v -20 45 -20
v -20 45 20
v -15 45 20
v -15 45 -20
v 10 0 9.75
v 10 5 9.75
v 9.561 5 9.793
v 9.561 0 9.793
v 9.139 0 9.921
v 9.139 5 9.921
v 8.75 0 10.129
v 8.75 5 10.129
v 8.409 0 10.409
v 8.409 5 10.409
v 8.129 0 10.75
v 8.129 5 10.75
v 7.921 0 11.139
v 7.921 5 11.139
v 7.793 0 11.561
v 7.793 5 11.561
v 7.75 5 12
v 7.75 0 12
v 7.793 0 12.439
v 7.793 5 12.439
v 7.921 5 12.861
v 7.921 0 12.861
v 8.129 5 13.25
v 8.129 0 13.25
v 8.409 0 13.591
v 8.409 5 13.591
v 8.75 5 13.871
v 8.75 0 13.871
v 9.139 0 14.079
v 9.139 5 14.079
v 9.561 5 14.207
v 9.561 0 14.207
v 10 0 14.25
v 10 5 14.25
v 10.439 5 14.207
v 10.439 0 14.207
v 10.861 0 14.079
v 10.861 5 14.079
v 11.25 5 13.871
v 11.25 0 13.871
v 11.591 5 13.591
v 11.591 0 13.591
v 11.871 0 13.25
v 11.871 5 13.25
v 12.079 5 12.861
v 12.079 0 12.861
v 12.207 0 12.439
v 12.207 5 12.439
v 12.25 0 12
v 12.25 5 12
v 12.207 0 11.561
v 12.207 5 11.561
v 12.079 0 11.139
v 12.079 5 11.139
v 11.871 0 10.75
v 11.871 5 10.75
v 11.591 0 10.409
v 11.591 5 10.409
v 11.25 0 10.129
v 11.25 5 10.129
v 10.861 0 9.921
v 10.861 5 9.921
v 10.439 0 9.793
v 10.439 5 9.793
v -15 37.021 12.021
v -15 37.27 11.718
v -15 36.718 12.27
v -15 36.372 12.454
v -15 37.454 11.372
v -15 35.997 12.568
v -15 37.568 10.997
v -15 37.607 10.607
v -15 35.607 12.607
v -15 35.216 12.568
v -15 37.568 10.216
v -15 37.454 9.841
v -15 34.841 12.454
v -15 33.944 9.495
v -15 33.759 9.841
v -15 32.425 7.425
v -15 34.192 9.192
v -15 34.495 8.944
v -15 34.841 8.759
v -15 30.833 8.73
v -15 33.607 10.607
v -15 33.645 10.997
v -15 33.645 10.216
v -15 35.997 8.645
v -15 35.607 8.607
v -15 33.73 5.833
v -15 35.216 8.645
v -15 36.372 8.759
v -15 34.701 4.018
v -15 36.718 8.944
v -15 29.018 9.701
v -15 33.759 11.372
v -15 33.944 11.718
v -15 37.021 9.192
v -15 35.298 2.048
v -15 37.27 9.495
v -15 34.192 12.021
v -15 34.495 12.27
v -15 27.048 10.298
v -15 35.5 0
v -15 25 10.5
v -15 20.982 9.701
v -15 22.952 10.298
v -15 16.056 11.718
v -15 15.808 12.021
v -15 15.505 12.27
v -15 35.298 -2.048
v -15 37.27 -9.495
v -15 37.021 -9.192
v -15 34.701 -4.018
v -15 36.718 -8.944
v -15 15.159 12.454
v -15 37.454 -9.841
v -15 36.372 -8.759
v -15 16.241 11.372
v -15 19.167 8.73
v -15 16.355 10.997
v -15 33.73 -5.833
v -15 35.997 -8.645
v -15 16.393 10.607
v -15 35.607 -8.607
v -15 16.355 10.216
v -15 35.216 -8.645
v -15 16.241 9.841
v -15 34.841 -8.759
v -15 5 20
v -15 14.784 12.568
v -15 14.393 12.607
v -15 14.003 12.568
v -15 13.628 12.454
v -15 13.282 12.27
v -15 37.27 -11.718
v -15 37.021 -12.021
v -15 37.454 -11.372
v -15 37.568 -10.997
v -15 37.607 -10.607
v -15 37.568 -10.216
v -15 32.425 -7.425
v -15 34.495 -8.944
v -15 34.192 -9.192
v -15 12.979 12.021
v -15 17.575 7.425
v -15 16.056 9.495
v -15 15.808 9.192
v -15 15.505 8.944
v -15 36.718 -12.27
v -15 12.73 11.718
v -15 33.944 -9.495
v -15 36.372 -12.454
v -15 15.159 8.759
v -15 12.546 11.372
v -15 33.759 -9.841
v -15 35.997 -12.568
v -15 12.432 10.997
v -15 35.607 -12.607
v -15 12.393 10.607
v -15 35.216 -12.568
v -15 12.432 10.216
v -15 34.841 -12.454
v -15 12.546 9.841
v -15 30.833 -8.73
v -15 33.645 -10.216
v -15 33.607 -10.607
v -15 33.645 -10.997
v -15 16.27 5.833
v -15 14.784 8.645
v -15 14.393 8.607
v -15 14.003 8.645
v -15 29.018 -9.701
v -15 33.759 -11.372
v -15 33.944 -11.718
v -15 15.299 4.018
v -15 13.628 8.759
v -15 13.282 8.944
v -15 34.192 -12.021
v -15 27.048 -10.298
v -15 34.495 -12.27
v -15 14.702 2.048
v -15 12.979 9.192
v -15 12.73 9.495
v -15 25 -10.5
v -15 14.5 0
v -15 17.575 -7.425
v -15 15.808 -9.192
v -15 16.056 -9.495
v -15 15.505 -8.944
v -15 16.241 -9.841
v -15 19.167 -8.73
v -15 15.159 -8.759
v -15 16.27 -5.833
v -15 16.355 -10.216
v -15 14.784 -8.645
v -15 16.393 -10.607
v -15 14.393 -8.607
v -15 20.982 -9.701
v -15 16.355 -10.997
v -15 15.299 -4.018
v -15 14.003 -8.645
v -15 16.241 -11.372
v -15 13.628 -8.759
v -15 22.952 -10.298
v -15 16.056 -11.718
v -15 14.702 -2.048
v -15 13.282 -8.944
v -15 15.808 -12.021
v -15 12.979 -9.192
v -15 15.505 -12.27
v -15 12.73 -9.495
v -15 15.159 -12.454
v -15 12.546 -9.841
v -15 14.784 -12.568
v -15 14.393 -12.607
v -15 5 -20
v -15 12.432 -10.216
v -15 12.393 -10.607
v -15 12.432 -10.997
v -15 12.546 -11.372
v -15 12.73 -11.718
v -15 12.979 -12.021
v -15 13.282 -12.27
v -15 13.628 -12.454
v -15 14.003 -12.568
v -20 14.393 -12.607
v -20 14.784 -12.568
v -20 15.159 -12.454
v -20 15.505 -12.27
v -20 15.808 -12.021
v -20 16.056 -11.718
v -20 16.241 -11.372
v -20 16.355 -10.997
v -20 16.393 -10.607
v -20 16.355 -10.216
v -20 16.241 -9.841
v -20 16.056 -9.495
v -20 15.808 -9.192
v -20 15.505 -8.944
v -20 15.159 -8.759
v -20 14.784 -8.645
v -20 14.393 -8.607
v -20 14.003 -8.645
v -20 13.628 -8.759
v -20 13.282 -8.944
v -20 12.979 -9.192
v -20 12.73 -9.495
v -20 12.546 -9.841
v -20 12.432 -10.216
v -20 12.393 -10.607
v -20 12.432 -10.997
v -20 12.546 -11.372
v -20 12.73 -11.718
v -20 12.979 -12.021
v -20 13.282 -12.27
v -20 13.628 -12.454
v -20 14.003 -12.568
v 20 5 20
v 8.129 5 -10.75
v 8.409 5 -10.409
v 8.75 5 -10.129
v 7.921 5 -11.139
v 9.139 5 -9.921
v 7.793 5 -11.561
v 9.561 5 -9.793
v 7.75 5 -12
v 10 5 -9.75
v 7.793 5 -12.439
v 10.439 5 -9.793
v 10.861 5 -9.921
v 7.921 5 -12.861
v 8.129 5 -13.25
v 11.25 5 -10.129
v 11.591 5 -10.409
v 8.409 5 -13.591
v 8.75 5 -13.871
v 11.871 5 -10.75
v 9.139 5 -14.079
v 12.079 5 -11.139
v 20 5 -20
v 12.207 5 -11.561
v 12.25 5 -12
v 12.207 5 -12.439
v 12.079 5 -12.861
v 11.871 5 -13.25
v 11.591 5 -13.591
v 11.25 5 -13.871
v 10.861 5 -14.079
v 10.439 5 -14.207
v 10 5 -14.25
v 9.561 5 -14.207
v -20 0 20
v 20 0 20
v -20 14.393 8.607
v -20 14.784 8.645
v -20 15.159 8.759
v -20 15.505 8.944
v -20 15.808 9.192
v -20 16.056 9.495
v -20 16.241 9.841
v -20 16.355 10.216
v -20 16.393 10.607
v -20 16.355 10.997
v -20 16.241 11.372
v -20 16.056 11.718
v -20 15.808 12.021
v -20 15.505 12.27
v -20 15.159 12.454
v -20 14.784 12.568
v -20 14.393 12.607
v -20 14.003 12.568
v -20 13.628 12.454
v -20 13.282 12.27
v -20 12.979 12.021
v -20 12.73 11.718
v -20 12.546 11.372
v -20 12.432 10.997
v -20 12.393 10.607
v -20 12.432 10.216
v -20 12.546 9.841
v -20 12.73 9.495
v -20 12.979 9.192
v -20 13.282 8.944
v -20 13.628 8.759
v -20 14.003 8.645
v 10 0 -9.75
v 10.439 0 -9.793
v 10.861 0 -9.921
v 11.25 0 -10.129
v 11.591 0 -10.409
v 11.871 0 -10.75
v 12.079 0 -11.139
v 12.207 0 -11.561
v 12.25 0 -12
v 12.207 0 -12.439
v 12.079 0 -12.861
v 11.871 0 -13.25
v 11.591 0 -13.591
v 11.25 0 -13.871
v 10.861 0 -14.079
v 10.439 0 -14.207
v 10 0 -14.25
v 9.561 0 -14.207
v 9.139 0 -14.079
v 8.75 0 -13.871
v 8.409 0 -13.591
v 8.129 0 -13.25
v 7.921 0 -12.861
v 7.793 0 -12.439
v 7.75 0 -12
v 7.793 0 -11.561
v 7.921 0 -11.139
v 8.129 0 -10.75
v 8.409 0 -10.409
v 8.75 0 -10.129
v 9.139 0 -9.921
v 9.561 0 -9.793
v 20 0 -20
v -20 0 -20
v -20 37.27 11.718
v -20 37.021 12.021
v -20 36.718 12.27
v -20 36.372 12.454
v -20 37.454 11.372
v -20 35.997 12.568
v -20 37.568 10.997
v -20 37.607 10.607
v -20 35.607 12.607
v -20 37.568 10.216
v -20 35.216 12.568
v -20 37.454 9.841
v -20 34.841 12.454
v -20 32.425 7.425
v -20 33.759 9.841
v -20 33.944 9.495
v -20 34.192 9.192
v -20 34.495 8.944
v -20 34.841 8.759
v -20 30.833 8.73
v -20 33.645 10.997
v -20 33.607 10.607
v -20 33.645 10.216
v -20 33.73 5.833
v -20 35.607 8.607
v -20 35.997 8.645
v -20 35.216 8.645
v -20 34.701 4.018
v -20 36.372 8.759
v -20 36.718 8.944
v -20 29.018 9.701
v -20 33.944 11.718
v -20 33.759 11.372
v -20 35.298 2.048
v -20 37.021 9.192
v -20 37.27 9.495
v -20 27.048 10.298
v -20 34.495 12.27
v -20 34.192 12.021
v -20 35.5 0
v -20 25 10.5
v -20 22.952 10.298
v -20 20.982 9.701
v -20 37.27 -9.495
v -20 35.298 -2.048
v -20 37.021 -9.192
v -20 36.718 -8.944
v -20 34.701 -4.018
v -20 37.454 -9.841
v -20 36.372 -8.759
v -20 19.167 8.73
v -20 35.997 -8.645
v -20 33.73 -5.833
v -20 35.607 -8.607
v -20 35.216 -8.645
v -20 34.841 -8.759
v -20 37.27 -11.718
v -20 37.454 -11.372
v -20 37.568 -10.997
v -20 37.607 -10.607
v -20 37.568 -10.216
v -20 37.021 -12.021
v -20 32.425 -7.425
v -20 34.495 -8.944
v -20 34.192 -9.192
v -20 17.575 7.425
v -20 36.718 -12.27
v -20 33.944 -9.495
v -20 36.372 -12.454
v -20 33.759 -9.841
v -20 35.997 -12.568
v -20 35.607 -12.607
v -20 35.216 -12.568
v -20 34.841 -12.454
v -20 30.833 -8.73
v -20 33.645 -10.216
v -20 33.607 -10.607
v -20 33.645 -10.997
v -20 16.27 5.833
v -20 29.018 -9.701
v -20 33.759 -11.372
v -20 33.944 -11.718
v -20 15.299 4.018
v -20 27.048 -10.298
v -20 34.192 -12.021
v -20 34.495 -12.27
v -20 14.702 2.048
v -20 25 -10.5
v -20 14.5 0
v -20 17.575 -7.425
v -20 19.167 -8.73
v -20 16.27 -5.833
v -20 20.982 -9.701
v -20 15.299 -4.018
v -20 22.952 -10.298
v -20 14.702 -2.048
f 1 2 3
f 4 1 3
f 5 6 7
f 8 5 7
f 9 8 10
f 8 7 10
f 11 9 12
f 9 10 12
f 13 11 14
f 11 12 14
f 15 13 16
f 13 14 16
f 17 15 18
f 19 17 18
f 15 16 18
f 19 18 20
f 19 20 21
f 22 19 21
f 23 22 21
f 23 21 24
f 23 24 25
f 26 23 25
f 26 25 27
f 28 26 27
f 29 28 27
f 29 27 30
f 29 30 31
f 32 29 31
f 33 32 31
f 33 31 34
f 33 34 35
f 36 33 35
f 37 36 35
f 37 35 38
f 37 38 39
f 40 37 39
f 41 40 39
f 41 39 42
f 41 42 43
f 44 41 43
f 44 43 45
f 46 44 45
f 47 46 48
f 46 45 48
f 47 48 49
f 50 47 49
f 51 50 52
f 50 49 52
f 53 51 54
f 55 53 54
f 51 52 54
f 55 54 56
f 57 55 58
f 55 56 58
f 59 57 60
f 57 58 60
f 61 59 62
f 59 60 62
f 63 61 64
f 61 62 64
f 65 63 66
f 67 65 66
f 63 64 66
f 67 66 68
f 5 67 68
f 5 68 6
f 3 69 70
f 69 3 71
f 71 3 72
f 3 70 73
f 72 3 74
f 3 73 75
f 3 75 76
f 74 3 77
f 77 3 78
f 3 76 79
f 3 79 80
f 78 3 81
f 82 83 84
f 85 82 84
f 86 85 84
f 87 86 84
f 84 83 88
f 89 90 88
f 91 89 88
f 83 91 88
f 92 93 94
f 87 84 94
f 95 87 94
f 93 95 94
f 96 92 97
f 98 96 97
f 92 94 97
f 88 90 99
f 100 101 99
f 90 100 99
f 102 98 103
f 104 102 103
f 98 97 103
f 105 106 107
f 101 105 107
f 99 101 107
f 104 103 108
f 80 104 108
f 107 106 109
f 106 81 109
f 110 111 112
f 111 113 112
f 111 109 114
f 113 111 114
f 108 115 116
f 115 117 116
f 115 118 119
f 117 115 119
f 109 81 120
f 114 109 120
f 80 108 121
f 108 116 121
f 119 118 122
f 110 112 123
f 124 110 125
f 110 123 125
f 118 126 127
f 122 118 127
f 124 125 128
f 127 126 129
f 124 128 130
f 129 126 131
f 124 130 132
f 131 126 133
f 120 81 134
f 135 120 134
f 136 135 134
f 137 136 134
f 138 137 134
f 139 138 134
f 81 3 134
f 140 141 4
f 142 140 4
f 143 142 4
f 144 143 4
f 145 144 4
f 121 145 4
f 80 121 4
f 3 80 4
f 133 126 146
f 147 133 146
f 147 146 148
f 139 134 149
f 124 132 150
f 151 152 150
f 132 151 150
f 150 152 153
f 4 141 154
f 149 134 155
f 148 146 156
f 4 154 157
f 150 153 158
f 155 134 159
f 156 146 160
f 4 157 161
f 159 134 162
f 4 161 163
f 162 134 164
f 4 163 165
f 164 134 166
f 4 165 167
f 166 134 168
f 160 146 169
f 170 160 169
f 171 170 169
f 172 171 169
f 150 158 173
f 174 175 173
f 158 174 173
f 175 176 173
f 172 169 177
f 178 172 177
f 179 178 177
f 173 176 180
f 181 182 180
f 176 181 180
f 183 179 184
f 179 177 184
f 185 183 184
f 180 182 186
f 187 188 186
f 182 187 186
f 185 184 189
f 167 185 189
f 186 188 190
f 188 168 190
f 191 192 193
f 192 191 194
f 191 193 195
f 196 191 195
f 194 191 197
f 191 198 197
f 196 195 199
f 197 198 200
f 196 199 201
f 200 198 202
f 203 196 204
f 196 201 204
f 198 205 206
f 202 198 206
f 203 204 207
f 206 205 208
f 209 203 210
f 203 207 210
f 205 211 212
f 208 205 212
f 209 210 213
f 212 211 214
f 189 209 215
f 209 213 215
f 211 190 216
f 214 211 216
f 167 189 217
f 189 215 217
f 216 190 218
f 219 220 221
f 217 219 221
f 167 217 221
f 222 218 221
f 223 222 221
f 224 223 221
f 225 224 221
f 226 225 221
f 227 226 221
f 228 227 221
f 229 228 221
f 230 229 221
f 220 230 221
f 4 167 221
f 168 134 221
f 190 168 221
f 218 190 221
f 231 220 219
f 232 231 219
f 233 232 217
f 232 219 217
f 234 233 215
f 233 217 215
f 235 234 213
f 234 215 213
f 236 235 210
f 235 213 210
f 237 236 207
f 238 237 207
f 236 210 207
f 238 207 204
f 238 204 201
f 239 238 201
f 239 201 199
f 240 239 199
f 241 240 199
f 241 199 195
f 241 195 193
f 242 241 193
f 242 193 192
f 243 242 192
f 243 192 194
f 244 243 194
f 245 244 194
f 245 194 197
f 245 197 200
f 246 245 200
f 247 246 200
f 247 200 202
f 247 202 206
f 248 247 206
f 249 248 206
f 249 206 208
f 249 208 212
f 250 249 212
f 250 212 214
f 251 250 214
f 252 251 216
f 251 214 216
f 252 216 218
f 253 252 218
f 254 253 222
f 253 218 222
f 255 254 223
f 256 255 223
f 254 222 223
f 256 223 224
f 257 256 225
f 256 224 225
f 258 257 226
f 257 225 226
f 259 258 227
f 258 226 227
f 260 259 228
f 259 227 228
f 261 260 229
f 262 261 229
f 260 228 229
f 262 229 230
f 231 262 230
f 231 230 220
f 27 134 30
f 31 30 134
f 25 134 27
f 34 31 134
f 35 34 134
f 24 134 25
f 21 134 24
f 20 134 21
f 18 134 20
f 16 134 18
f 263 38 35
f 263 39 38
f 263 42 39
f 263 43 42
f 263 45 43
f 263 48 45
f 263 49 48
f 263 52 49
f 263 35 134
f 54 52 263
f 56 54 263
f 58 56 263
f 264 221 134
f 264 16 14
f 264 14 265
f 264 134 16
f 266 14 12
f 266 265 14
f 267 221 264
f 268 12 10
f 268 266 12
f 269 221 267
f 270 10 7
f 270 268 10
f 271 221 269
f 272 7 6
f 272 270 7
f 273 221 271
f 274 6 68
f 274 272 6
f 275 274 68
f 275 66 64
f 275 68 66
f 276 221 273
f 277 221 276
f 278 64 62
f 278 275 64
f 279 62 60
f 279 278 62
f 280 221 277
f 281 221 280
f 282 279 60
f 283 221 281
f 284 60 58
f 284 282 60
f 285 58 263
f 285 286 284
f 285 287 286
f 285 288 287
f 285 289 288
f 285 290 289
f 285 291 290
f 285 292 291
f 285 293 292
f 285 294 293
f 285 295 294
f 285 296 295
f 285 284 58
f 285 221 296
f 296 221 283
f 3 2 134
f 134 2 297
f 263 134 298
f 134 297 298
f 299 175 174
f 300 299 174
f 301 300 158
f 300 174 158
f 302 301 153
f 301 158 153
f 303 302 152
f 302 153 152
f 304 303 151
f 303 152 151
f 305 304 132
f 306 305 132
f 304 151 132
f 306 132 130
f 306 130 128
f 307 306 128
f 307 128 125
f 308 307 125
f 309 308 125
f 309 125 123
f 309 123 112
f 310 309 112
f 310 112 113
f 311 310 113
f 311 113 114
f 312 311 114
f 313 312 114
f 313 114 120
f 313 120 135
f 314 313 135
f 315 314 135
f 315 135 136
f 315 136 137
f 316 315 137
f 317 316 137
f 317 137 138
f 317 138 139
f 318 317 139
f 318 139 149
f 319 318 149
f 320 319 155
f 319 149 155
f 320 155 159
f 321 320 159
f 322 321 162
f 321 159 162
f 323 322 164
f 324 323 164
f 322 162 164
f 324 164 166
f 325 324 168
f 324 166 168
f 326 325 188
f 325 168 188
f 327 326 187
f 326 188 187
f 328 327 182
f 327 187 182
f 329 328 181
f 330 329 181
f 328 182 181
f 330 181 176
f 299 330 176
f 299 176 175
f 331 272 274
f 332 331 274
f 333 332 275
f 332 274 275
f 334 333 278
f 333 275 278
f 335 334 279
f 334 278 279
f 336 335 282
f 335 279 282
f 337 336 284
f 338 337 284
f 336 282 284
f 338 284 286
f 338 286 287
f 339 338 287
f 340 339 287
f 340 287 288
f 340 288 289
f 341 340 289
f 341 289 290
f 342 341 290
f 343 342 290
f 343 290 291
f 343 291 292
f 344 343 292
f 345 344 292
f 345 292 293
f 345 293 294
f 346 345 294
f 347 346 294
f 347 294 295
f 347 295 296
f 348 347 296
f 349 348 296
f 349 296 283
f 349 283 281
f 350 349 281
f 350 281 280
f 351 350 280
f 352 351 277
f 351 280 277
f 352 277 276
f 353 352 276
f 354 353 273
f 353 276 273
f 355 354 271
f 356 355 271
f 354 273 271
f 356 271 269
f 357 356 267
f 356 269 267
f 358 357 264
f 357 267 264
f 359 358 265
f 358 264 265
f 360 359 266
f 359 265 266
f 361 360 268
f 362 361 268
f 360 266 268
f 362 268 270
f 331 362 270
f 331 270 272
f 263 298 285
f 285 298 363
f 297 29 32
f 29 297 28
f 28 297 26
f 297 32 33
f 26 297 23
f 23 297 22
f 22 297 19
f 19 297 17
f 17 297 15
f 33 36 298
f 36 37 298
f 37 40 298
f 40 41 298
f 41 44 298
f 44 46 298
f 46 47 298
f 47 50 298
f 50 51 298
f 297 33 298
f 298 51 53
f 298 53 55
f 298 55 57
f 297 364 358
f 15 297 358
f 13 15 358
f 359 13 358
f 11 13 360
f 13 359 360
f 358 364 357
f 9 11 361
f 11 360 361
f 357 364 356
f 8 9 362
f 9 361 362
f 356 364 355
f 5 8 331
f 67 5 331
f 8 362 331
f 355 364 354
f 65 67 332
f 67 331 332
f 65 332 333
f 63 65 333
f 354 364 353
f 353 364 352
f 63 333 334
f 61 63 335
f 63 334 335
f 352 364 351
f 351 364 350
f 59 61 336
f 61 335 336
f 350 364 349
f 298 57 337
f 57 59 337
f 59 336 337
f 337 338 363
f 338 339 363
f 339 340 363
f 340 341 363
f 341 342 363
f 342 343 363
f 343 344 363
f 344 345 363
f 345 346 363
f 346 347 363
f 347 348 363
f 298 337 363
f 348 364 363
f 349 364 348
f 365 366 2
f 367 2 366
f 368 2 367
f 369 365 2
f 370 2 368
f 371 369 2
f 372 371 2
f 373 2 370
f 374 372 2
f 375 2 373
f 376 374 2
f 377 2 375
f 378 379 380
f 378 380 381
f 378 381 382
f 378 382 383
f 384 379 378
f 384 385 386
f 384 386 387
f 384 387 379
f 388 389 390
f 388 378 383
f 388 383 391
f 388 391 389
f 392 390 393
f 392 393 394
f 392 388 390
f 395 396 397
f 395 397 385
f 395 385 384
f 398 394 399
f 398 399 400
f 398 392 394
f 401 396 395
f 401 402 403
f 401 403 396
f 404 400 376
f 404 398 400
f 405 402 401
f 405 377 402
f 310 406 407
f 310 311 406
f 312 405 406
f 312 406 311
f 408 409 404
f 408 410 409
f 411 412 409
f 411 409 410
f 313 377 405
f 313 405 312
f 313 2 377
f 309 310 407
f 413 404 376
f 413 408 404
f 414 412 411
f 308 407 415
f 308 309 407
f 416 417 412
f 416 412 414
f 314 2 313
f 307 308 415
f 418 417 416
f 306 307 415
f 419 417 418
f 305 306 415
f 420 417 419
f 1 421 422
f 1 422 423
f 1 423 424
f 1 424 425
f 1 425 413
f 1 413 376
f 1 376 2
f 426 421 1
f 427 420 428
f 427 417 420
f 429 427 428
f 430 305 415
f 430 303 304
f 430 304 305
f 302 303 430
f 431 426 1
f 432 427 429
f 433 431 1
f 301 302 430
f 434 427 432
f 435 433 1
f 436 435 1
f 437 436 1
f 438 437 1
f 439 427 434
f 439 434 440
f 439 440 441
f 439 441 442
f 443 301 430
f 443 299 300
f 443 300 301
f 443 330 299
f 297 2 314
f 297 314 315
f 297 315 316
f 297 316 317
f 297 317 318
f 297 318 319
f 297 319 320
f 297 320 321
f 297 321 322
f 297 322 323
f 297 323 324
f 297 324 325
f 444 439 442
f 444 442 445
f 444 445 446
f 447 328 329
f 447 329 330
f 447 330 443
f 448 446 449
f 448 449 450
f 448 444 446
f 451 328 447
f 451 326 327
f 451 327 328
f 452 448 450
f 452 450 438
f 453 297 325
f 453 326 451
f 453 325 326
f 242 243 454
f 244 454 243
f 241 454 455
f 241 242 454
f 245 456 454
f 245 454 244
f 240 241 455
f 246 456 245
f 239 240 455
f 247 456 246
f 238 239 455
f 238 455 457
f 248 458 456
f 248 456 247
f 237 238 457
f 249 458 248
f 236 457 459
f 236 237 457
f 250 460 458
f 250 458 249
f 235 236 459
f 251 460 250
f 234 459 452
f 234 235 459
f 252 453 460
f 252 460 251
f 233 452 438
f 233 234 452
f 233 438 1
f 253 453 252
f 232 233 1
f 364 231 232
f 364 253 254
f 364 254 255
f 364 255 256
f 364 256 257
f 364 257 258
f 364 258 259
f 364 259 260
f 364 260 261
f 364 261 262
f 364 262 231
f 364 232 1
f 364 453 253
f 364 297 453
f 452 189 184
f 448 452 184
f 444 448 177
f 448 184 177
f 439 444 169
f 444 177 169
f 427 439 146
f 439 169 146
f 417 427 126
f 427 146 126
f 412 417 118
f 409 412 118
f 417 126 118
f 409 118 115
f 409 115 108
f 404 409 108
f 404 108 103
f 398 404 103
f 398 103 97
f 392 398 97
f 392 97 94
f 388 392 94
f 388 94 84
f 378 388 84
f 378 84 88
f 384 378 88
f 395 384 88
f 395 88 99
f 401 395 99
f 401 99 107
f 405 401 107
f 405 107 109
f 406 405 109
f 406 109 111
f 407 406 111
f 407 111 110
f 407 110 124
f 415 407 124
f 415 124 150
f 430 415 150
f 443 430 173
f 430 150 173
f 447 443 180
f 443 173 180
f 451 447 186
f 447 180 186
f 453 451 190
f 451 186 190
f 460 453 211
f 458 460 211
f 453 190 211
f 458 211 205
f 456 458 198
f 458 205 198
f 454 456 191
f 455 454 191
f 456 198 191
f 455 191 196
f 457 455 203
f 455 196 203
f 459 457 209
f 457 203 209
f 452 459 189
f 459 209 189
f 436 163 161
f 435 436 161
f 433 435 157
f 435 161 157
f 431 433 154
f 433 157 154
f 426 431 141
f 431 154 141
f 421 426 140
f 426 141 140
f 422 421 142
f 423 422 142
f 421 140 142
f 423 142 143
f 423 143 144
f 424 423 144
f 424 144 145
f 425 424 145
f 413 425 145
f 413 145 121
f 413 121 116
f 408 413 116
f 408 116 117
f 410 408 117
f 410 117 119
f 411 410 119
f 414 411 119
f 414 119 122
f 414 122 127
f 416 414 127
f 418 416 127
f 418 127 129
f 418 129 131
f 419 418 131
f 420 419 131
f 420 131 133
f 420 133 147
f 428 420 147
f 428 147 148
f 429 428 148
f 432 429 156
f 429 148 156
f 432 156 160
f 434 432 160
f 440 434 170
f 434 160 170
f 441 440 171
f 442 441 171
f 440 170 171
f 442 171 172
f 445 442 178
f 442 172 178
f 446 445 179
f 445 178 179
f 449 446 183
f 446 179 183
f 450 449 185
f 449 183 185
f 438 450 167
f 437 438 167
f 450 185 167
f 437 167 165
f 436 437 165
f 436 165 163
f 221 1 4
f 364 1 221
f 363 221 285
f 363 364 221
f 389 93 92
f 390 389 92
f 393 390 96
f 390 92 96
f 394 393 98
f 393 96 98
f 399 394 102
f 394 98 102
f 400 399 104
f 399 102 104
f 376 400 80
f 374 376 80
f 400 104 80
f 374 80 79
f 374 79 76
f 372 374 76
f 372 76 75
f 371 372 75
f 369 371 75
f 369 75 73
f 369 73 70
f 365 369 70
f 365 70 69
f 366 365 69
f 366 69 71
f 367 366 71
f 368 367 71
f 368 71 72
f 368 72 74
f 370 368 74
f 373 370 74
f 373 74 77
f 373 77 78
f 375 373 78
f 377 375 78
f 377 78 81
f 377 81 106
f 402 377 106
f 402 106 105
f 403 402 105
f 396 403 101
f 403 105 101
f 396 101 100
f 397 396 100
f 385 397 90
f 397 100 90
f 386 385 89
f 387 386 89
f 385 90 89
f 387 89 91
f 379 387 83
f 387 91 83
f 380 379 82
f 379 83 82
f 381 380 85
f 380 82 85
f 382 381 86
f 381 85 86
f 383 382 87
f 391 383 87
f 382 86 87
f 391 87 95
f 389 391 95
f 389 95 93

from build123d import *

# Parameters (mm, degrees)
SKETCH1_W           = 40
SKETCH1_H           = 40
BOSS_EXTRUDE1_DEPTH = 5
SKETCH3_W           = 5
SKETCH3_H           = 40
BOSS_EXTRUDE6_DEPTH = 40
SKETCH4_R           = 2.25
CUT_EXTRUDE2_DEPTH  = 49.989794856
SKETCH5_R           = 10.5
SKETCH5_R_2         = 2
CUT_EXTRUDE3_DEPTH  = 61.415229868


with BuildPart() as part:
    # Sketch1 → Boss-Extrude1 (new body)
    with BuildSketch(Plane(origin=(0, 0, 0), x_dir=(1, 0, 0), z_dir=(0, 1, 0))):
        Rectangle(SKETCH1_W, SKETCH1_H)
    extrude(amount=BOSS_EXTRUDE1_DEPTH)

    # Sketch3 → Boss-Extrude6 (add)
    with BuildSketch(Plane(origin=(0, 5, 0), x_dir=(1, 0, 0), z_dir=(0, 1, 0))):
        with Locations((-17.5, 0)):
            Rectangle(SKETCH3_W, SKETCH3_H)
    extrude(amount=BOSS_EXTRUDE6_DEPTH)

    # Sketch4 → Cut-Extrude2 (cut, through all)
    with BuildSketch(Plane(origin=(0, 5, 0), x_dir=(1, 0, 0), z_dir=(0, 1, 0))):
        with Locations(Location((10, 12, 0), (0, 0, 270))):
            Circle(SKETCH4_R)
        with Locations(Location((10, -12, 0), (0, 0, 90))):
            Circle(SKETCH4_R)
    extrude(amount=-CUT_EXTRUDE2_DEPTH, mode=Mode.SUBTRACT)

    # Sketch5 → Cut-Extrude3 (cut, through all)
    with BuildSketch(Plane(origin=(-15, 0, 0), x_dir=(0, 0, -1), z_dir=(1, 0, 0))):
        with Locations((0, 25)):
            Circle(SKETCH5_R)
        with Locations((-10.606601718, 35.606601718)):
            Circle(SKETCH5_R_2)
        with Locations((10.606601718, 35.606601718)):
            Circle(SKETCH5_R_2)
        with Locations((10.606601718, 14.393398282)):
            Circle(SKETCH5_R_2)
        with Locations((-10.606601718, 14.393398282)):
            Circle(SKETCH5_R_2)
    extrude(amount=-CUT_EXTRUDE3_DEPTH, mode=Mode.SUBTRACT)


solid = part.part
